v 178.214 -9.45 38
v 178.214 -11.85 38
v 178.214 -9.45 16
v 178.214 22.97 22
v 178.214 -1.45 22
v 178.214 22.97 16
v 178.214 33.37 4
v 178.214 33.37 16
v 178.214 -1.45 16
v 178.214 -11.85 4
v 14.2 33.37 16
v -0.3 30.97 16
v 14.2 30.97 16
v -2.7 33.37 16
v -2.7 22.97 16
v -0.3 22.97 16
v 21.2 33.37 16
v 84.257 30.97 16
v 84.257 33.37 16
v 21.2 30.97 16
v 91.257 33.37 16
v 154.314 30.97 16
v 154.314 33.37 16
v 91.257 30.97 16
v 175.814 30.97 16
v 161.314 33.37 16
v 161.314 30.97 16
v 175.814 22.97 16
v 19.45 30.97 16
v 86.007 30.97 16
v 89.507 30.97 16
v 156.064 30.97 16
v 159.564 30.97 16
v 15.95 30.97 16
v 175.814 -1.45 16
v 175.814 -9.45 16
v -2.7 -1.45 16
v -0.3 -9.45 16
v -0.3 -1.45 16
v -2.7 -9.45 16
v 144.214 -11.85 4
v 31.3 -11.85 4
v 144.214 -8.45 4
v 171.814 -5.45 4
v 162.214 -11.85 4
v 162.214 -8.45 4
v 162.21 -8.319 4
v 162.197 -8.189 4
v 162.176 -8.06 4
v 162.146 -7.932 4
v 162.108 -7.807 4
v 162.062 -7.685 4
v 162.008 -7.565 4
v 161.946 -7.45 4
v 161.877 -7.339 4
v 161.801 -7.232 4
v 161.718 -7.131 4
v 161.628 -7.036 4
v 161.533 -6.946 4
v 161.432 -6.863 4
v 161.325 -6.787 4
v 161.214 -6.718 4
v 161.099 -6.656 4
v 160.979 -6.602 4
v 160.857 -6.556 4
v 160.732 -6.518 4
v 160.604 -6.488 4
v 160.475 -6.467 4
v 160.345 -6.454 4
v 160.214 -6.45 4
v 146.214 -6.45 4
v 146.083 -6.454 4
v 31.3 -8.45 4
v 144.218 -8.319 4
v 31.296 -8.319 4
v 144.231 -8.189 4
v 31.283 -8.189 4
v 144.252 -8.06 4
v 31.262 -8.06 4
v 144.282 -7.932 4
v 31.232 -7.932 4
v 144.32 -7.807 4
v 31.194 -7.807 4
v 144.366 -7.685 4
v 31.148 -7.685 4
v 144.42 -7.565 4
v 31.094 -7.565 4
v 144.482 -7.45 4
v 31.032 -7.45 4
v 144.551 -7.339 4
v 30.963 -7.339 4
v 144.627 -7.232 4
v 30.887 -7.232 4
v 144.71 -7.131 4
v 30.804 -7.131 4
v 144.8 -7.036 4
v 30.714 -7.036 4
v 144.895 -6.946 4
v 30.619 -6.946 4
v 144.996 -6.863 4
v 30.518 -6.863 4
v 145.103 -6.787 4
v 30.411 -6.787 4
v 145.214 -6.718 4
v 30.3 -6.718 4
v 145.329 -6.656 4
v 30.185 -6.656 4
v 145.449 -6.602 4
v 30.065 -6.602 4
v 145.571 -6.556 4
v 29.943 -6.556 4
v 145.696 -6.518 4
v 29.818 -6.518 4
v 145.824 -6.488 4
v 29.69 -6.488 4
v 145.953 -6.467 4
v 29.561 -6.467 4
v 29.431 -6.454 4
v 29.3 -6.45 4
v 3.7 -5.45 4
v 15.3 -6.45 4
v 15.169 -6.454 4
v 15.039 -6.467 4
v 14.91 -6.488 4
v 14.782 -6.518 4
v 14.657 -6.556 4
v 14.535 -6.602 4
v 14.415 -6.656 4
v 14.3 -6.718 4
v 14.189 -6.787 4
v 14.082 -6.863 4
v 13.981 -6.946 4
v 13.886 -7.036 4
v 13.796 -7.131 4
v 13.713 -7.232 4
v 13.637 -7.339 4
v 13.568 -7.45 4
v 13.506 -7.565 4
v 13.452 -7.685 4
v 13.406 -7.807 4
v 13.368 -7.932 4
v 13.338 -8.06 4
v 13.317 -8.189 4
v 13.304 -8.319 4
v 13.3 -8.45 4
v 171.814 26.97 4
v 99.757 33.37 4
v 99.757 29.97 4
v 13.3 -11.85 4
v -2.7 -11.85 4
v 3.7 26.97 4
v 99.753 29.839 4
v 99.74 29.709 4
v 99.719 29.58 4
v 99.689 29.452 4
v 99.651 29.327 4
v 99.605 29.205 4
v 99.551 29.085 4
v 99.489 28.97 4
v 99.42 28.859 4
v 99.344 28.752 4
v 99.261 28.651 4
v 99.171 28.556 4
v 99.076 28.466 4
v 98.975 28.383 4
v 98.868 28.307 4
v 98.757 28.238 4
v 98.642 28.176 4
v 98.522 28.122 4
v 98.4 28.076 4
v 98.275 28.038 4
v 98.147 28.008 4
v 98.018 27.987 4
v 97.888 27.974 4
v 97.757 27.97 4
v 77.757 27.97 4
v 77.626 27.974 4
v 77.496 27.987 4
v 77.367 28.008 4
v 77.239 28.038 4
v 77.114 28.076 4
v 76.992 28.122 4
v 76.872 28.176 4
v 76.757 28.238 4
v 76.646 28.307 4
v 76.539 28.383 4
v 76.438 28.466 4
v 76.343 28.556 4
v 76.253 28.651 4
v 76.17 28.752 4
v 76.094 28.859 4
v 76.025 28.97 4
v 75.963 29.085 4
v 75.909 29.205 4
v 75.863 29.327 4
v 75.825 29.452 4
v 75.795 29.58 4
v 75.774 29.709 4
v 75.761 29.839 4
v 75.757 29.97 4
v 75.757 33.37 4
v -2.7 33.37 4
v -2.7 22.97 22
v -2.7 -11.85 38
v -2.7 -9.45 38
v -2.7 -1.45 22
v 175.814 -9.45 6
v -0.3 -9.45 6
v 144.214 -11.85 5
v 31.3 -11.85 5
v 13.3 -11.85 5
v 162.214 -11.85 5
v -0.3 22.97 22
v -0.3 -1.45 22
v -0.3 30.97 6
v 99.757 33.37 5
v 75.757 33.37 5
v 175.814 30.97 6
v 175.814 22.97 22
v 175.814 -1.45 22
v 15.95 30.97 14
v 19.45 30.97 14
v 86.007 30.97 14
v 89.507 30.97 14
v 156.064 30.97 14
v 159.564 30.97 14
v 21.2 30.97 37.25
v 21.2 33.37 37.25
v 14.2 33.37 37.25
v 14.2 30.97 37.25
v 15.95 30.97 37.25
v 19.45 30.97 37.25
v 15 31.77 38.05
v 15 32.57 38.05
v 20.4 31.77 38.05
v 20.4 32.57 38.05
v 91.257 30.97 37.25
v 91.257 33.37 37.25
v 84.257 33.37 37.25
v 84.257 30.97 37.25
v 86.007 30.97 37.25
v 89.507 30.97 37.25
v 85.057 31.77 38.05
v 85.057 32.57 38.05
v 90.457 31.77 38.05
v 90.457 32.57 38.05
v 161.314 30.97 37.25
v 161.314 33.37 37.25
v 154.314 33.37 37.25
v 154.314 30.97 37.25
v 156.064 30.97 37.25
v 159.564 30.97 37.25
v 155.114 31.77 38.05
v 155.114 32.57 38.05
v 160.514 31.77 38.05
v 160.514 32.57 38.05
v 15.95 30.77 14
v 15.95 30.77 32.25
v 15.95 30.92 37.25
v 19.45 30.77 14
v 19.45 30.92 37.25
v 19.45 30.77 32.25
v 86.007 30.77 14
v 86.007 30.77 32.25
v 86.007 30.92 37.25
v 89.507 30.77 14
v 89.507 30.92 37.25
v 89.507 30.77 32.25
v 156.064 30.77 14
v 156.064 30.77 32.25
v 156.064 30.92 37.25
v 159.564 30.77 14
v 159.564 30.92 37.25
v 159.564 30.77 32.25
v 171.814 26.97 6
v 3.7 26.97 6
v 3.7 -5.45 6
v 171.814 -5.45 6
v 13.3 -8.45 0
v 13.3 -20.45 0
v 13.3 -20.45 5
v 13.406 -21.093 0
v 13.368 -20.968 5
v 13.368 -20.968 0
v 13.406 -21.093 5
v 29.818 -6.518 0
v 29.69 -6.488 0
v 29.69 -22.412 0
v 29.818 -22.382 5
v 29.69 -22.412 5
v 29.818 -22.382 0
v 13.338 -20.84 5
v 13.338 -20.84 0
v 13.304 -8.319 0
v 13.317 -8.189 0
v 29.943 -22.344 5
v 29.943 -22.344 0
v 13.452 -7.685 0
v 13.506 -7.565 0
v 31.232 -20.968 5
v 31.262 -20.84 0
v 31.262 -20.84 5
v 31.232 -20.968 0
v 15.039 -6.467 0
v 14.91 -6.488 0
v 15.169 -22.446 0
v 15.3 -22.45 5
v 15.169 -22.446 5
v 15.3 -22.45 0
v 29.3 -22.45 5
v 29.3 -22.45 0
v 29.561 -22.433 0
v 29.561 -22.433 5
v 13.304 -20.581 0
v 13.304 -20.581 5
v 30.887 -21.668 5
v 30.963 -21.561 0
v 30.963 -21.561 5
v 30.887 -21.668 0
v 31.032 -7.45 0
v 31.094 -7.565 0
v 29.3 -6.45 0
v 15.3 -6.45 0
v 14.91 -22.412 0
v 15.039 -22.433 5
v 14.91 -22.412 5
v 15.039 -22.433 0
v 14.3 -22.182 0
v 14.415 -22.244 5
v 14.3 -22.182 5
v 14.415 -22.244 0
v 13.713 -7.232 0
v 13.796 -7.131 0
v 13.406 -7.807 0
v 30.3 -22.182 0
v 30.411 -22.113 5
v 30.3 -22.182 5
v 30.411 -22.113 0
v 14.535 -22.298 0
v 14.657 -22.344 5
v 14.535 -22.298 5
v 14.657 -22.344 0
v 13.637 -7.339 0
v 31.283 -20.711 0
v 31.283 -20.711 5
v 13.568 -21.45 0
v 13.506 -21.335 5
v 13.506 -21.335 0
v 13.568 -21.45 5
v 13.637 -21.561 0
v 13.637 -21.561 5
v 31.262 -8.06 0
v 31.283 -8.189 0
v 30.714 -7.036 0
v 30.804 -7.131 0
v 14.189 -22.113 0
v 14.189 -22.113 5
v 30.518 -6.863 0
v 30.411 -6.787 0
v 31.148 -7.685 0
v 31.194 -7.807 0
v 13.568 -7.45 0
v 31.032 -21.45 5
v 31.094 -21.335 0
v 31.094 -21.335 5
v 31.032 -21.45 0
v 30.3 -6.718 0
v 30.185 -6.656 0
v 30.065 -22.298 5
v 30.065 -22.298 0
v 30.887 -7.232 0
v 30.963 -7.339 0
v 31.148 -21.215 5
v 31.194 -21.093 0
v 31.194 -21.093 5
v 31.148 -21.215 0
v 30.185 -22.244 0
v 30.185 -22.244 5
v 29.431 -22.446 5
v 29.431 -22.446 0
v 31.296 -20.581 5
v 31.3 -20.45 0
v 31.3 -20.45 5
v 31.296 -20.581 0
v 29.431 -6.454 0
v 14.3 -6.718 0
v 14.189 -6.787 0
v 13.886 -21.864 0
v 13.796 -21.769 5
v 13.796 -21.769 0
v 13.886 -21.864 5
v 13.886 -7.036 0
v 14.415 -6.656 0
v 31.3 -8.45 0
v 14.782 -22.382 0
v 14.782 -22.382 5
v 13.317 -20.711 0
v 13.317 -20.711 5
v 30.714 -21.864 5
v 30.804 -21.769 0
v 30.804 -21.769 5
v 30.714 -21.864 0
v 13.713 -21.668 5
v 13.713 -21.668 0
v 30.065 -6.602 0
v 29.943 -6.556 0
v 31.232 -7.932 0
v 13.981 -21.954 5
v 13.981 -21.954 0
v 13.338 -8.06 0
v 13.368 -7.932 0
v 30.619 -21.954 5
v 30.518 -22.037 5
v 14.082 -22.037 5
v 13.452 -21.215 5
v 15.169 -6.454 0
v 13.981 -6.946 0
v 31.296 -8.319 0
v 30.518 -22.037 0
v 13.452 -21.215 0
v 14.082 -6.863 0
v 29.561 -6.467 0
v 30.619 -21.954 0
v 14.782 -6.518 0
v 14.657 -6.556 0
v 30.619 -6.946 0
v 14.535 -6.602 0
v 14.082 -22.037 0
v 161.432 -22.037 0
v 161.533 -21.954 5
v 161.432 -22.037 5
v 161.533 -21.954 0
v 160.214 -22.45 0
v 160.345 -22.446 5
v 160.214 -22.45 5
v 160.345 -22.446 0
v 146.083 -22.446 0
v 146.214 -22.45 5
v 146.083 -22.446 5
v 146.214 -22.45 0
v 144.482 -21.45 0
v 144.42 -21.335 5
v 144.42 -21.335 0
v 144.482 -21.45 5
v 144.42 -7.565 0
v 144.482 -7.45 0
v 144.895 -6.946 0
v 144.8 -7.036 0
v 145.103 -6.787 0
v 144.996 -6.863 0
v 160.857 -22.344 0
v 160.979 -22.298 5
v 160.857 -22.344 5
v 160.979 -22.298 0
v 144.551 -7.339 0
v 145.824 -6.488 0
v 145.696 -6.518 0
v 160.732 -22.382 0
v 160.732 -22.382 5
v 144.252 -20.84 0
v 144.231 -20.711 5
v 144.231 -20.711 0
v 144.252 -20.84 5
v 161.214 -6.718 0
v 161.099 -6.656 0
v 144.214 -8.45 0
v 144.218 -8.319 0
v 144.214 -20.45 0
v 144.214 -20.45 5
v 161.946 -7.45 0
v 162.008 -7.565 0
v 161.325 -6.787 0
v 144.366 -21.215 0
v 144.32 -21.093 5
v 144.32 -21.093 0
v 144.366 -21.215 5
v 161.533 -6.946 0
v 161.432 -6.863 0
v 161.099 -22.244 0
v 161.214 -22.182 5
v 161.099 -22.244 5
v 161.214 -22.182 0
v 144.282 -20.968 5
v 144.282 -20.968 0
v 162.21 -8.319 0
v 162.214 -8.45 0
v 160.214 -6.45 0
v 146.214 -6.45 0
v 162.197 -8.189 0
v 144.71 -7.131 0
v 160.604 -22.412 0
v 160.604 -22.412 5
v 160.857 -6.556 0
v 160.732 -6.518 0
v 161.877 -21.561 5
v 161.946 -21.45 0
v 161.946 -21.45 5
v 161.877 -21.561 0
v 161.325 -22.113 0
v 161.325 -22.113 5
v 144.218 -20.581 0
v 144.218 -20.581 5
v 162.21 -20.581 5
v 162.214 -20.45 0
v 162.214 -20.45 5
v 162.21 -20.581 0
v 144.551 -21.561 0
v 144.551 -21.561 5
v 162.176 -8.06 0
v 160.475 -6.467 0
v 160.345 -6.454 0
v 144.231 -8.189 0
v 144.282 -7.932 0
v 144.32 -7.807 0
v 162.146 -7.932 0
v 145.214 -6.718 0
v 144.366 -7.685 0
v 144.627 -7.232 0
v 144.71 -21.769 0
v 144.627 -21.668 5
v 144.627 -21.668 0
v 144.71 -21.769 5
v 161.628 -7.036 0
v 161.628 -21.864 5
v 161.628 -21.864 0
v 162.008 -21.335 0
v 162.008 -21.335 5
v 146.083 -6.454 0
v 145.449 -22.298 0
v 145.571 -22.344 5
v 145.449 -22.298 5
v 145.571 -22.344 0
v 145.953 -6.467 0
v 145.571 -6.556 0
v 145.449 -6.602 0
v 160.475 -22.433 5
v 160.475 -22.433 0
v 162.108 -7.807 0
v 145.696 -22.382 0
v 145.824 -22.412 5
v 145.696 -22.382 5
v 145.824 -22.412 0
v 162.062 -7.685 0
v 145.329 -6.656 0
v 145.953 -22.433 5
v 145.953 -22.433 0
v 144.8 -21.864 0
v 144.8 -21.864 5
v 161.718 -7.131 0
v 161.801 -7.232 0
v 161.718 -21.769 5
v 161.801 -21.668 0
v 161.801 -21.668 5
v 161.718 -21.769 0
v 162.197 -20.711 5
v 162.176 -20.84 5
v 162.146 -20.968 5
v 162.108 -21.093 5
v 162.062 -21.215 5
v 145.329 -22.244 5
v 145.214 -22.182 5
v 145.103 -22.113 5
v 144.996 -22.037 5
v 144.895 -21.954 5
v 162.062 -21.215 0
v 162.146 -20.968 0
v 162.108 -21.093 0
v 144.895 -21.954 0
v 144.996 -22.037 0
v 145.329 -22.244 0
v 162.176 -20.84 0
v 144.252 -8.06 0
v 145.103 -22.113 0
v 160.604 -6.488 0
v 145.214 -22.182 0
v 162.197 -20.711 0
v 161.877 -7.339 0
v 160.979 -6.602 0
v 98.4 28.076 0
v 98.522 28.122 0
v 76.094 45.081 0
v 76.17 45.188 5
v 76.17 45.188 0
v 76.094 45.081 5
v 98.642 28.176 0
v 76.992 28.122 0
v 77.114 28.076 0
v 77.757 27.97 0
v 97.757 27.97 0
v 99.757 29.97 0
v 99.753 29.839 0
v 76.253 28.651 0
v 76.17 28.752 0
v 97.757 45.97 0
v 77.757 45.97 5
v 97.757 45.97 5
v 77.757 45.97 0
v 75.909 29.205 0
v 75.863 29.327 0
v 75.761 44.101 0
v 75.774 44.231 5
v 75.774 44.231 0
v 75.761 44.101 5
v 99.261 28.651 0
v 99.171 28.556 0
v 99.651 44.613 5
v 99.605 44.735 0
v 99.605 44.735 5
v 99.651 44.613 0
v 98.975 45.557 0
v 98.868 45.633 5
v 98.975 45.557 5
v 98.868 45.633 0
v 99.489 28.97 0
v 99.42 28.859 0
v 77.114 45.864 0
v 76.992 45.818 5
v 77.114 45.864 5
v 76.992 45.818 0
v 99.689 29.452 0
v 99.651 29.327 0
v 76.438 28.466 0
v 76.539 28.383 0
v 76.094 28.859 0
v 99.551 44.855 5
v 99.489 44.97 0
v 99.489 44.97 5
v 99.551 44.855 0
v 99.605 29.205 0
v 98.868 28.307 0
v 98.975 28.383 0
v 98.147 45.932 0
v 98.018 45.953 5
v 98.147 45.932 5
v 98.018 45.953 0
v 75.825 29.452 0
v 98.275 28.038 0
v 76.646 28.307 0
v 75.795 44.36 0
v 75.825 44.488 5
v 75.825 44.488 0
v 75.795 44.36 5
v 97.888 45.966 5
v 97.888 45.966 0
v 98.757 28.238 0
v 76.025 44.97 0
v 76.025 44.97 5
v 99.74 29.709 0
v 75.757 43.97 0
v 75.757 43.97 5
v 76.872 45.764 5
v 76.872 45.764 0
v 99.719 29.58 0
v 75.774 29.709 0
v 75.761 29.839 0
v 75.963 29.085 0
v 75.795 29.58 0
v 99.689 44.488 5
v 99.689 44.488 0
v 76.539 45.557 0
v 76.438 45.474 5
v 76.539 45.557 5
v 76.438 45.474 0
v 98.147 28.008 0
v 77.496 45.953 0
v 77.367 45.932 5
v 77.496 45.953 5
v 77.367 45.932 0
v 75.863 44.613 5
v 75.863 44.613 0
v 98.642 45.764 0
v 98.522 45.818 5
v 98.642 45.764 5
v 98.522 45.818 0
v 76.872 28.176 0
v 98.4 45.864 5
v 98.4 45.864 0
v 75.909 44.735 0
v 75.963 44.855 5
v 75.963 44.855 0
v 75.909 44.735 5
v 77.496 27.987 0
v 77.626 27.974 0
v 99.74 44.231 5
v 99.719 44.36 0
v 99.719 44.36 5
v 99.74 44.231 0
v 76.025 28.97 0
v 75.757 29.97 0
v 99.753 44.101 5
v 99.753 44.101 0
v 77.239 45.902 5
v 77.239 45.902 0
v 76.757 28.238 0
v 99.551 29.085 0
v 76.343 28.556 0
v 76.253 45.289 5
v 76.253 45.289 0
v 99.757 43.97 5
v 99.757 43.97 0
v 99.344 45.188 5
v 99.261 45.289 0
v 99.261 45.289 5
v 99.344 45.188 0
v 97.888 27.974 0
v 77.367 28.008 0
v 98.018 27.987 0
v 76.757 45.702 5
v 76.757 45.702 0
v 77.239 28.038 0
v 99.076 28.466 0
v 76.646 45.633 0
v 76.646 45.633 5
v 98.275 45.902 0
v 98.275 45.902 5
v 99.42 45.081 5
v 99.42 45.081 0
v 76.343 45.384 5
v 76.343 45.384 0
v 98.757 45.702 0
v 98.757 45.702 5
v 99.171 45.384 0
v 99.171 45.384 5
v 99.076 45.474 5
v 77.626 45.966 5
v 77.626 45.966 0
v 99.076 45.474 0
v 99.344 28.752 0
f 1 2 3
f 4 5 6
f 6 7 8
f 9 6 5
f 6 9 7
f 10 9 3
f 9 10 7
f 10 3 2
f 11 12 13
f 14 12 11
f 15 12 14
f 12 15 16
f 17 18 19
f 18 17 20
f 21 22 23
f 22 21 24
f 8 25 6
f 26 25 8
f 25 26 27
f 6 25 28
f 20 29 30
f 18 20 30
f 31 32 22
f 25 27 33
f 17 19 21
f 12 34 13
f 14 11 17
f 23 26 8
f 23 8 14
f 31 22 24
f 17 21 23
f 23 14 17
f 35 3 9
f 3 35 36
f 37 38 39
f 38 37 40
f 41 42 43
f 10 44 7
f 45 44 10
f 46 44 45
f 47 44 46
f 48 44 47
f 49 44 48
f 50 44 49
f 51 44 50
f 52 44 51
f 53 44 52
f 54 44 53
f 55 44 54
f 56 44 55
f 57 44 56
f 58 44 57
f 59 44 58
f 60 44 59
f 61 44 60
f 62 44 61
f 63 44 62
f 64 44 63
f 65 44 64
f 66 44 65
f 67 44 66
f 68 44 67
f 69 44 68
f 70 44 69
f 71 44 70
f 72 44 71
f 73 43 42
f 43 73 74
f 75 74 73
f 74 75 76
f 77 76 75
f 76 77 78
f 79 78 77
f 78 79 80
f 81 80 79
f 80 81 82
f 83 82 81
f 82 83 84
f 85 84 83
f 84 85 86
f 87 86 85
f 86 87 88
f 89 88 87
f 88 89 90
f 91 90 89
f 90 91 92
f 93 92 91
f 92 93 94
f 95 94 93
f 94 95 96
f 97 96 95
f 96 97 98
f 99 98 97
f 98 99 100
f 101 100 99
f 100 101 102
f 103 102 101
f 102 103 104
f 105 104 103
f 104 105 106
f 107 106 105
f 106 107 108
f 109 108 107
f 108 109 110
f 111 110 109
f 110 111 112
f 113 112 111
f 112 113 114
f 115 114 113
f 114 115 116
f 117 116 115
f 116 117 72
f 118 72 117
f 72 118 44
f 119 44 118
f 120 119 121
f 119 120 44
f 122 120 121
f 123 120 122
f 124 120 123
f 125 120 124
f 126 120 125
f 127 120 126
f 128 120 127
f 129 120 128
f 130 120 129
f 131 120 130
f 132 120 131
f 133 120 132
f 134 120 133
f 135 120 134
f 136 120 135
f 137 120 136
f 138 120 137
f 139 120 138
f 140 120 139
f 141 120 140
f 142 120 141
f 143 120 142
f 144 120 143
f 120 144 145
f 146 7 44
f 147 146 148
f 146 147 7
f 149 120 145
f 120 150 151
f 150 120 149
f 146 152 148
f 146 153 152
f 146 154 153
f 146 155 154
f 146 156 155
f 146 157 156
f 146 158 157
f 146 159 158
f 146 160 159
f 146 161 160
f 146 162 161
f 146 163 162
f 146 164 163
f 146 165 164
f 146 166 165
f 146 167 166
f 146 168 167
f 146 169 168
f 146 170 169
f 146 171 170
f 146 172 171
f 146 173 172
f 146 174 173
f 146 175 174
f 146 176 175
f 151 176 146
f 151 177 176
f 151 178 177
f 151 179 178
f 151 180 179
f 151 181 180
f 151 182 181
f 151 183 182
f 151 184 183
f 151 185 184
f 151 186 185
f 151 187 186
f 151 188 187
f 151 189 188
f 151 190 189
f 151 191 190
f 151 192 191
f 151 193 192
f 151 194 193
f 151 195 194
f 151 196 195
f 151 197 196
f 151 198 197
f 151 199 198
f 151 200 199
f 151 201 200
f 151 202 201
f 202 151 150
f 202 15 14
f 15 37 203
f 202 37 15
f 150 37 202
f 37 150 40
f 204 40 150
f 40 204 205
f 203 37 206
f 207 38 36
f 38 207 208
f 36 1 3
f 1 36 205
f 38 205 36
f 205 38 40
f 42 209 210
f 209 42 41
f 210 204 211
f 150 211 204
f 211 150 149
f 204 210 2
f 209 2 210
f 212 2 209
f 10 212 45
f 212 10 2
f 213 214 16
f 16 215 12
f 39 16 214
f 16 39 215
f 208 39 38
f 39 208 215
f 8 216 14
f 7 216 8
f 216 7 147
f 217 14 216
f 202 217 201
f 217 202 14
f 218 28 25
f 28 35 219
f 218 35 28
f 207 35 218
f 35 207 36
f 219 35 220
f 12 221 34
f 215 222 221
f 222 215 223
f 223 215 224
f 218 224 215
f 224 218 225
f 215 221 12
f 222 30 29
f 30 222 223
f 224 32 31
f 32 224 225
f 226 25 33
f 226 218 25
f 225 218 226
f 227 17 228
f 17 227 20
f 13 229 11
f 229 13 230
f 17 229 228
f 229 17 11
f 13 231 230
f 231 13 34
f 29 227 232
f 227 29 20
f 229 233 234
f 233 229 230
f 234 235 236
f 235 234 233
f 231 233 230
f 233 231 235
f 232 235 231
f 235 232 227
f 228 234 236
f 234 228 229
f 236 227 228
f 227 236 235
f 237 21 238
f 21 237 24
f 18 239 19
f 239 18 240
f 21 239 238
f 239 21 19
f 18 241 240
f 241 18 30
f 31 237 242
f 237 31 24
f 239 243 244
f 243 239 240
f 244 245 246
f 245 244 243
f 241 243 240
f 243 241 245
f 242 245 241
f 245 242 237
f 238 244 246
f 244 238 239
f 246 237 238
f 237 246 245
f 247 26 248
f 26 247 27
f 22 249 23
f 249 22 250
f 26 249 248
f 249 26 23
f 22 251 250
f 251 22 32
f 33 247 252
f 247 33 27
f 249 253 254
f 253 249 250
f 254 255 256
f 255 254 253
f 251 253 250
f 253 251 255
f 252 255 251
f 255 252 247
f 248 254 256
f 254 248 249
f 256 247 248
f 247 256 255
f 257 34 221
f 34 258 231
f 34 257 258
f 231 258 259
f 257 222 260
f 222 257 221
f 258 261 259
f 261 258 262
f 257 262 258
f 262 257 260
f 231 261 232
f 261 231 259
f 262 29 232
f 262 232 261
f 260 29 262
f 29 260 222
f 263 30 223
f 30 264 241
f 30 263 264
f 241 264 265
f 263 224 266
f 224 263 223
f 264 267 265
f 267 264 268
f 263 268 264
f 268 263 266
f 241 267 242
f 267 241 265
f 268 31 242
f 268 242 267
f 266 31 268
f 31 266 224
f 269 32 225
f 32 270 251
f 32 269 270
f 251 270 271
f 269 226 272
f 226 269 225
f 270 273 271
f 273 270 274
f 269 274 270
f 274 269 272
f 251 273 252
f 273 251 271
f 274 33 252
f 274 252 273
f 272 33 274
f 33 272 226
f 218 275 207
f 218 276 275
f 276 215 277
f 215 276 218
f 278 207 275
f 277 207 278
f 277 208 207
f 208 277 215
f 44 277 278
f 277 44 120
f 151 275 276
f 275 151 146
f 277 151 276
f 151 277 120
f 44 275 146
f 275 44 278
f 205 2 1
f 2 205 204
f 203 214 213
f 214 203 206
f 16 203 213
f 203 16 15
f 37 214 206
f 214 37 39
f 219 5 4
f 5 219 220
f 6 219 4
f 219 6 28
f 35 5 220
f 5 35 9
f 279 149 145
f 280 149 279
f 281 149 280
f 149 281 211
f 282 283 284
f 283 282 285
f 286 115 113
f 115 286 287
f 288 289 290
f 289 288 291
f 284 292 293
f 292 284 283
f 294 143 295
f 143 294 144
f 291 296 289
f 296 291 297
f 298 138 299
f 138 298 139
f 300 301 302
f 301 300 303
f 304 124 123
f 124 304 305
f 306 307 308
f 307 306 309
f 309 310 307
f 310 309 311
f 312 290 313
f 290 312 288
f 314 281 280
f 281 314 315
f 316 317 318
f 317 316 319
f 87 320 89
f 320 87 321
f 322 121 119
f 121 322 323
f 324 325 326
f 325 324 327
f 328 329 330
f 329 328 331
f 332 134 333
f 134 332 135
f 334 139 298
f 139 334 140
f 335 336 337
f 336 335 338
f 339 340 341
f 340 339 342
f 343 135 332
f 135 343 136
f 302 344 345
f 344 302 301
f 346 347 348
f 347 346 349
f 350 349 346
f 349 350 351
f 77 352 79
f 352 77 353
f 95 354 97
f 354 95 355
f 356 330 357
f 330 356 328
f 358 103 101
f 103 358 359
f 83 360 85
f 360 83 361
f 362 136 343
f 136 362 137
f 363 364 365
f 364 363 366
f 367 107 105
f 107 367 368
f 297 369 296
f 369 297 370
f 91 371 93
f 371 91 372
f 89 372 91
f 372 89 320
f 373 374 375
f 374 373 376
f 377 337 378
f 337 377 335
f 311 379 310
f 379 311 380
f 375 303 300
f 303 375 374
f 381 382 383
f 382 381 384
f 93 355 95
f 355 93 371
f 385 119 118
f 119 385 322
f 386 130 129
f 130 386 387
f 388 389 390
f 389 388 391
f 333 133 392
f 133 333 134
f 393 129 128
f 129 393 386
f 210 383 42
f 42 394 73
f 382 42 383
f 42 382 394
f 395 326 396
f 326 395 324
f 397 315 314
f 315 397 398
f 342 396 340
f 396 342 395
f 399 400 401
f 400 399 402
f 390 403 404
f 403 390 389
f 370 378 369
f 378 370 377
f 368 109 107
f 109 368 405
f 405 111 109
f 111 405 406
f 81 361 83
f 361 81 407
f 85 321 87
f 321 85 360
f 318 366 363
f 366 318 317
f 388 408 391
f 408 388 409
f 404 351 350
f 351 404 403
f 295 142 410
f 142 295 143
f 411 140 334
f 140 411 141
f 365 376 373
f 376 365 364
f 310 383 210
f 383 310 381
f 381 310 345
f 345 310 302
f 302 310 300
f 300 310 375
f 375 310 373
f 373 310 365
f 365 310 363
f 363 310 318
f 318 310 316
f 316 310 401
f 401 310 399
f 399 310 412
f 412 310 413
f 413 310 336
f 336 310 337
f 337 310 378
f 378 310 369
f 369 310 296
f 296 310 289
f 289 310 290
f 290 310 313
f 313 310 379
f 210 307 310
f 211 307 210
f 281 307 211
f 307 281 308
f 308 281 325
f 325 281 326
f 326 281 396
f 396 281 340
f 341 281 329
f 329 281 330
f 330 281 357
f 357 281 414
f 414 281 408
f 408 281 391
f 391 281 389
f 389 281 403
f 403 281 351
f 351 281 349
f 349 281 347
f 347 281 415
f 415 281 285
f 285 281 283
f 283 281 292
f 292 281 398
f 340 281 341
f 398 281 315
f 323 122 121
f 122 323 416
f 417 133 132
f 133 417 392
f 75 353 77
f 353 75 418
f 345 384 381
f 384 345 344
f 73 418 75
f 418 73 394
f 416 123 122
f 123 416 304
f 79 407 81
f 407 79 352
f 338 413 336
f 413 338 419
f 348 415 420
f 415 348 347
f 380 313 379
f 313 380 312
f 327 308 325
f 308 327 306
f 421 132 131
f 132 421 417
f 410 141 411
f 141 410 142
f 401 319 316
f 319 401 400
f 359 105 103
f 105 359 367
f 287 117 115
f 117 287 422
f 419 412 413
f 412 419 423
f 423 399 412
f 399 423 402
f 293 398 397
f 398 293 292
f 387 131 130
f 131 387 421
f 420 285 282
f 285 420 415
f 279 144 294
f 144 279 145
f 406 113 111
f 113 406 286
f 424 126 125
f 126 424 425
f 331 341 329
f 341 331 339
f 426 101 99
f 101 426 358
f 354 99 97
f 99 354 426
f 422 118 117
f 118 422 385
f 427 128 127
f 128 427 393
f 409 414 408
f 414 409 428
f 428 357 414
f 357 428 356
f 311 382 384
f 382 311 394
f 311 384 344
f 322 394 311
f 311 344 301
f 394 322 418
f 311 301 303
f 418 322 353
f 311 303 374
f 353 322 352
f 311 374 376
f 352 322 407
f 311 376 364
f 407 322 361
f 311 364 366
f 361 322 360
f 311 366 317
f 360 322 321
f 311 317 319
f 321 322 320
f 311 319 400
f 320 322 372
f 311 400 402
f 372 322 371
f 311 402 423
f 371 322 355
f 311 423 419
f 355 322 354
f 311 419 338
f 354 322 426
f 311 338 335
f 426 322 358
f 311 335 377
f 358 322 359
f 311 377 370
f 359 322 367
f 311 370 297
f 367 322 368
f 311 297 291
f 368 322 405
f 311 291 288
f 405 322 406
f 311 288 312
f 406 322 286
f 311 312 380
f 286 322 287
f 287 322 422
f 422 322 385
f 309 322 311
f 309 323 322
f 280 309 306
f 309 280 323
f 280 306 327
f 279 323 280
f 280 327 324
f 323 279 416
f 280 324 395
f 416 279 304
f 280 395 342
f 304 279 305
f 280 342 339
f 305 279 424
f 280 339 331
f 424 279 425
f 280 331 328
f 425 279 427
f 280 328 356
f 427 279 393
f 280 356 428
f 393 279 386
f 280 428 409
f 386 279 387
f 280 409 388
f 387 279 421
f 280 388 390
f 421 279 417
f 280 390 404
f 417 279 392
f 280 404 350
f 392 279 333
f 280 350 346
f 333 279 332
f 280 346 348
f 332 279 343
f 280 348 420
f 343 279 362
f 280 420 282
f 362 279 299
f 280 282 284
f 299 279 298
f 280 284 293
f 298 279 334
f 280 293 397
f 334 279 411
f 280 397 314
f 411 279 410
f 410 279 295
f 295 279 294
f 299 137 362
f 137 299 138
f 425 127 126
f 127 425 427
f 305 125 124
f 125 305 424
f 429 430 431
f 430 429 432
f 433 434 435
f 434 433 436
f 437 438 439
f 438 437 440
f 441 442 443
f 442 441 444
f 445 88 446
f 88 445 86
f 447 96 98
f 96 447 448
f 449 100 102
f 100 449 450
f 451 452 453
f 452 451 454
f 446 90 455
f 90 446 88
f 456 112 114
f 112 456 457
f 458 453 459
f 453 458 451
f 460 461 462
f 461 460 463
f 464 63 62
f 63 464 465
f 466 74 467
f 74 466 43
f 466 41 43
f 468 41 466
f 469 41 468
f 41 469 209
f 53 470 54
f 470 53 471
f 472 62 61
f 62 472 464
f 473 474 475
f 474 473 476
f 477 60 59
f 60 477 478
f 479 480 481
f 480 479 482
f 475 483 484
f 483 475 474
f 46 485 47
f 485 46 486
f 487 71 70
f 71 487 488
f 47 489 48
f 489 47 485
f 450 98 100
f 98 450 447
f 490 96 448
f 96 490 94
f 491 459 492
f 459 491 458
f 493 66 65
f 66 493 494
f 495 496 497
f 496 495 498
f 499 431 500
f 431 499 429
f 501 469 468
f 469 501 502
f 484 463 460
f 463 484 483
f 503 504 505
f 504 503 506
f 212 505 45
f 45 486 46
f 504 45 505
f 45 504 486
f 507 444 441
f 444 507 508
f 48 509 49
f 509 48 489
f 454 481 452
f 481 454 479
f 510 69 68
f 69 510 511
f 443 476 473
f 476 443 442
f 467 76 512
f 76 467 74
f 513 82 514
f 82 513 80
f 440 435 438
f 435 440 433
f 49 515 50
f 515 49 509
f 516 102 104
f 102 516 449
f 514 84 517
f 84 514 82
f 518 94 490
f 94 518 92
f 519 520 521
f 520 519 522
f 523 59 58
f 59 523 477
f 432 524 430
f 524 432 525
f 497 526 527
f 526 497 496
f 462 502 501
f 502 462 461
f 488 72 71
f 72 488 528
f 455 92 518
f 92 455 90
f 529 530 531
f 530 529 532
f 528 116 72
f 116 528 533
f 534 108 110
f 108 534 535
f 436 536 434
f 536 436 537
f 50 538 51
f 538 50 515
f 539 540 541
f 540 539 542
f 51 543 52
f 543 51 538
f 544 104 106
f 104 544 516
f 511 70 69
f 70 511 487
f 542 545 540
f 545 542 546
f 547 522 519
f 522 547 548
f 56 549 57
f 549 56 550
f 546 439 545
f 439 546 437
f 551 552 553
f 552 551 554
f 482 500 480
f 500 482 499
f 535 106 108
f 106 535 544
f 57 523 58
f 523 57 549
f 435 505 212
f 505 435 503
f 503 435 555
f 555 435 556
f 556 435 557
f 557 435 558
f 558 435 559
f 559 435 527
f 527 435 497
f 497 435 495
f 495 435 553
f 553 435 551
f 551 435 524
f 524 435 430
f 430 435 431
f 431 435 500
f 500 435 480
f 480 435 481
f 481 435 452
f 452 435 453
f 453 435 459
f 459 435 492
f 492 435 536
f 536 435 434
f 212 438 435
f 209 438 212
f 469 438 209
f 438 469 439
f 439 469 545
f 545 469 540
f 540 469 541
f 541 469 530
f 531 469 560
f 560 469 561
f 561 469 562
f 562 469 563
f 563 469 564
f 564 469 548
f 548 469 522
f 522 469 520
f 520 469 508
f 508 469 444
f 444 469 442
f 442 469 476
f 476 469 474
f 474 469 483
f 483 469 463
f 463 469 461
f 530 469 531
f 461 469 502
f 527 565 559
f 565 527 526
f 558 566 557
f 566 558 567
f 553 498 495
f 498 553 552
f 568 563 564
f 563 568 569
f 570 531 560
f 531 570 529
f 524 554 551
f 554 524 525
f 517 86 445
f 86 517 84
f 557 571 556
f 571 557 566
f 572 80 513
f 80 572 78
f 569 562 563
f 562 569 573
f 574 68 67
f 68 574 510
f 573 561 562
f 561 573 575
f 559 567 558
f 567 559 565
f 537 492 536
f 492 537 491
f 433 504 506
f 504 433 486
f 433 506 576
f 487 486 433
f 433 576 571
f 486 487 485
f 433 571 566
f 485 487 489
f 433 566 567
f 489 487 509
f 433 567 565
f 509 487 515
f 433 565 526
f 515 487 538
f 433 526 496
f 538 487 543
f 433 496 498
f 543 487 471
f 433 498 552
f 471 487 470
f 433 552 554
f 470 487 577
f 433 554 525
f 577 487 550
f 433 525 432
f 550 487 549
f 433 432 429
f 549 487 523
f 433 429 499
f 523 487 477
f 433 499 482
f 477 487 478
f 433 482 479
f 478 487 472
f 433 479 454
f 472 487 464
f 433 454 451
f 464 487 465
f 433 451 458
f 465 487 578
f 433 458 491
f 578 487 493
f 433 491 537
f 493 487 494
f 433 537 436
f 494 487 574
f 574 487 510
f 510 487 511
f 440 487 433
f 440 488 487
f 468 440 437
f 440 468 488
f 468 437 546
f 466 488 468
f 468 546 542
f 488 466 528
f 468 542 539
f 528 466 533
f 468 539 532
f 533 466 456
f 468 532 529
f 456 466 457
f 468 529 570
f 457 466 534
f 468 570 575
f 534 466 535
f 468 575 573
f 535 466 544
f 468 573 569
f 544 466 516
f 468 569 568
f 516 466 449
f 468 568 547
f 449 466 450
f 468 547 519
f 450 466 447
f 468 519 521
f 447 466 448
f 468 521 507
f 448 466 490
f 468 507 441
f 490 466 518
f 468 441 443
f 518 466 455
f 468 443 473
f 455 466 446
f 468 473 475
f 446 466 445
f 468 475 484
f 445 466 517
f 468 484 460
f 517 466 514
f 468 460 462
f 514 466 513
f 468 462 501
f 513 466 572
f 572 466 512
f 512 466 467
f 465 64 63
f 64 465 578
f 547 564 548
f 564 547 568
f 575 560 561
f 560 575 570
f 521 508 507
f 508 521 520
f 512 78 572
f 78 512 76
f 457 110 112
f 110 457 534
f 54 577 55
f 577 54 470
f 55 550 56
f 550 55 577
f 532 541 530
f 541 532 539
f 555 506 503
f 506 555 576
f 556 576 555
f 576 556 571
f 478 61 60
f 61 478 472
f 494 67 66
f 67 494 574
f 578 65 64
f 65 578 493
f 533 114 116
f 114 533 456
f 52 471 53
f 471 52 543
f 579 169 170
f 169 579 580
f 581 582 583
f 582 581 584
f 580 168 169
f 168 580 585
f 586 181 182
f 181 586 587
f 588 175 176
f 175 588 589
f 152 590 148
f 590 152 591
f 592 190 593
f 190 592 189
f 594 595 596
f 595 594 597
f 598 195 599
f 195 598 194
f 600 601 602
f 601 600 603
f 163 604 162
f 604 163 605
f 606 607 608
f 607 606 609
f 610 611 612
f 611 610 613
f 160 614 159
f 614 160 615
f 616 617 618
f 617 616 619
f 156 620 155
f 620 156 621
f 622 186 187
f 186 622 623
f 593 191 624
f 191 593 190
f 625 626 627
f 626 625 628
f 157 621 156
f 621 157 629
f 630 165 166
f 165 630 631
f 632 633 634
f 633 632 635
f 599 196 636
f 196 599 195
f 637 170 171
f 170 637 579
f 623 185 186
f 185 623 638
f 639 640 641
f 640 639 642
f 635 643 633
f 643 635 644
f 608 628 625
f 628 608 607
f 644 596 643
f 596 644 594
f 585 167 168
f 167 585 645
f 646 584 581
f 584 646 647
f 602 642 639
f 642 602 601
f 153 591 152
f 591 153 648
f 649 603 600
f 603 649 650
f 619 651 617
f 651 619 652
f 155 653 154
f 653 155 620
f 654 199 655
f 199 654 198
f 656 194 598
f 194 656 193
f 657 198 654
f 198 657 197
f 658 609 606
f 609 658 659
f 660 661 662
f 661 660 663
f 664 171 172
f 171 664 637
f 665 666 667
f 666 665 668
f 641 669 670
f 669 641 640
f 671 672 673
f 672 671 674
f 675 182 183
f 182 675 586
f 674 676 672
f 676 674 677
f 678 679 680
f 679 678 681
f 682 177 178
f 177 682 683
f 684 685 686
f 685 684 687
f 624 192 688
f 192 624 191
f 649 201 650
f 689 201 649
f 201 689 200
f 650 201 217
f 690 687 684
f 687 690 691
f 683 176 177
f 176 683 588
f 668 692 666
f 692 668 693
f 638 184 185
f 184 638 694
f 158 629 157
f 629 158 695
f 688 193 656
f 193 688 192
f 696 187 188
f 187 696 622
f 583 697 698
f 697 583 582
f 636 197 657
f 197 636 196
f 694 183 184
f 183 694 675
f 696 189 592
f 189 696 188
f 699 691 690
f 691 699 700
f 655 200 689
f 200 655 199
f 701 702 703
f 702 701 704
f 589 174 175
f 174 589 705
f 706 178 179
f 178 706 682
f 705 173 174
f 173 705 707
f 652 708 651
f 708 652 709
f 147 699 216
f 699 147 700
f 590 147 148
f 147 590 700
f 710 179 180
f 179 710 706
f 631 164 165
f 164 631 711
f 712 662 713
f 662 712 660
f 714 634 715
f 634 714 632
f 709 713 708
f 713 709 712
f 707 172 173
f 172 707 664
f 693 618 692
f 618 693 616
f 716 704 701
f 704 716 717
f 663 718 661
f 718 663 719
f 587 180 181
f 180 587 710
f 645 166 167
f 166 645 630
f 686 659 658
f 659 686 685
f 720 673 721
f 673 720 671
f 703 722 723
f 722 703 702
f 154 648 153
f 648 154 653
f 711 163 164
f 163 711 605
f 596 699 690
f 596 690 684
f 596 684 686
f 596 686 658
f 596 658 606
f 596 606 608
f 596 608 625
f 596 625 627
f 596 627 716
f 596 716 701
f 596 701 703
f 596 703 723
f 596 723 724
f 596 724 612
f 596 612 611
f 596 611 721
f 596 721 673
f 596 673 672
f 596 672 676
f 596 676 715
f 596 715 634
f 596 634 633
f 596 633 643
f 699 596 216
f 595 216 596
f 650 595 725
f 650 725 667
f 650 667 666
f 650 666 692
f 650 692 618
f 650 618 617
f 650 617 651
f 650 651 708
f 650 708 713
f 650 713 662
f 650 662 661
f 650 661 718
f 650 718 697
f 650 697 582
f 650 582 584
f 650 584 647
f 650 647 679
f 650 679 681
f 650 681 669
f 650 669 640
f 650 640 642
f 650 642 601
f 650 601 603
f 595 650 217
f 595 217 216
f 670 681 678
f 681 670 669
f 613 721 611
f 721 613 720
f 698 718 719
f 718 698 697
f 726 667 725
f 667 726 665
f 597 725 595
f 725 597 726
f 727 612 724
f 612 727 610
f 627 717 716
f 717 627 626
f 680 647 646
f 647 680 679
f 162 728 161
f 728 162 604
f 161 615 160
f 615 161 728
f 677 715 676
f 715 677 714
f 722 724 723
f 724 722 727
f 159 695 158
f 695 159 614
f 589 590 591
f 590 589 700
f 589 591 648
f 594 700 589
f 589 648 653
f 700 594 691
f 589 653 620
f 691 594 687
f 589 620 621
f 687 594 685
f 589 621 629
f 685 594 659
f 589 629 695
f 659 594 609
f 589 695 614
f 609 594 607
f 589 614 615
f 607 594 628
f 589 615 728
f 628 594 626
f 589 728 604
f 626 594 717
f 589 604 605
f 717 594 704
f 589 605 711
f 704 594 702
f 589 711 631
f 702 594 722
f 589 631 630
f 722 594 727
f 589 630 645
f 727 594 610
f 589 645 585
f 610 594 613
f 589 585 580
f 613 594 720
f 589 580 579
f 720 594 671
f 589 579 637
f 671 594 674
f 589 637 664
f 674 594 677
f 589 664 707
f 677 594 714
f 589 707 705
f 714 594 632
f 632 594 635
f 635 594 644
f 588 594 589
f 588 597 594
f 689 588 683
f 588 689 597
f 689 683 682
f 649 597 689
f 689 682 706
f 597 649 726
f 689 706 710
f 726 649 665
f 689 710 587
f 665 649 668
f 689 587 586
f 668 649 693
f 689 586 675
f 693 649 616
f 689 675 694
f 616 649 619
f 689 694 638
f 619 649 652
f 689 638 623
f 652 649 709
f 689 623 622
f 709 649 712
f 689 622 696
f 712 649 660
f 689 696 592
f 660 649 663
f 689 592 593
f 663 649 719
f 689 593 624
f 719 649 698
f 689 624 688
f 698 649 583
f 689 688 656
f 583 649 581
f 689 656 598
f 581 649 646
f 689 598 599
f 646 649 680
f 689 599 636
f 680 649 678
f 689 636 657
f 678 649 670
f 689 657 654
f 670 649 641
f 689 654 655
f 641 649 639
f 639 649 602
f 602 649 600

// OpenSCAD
// DOUBLE TAKE FRAMES DESIGN RELEASE
// DTF_RELEASE: 2.0.0
// Released: 2026-08-31
// Versioning: Semantic Versioning 2.0.0 (https://semver.org/)
// Status: CANONICAL
// Changes in 2.0.0:
// - Carried forward without geometry changes for the coordinated 2.0.0 release.
// Full release notes: https://doubletakeframes.com/build/#design-release
//
$fn = 96;
eps = 0.05;

// =========================================================
// DETACHABLE FRONT BAND + SIDE WALLS + REAR POSTS + FEETS
// Continuous low rail all around.
// Side walls sit on rail but do not connect to front/back above rail.
// Non-friction resting fit.
//
// Corrected:
// - Feet overlap collar/body in Z by foot_body_z_overlap, not just eps.
// - Each foot is shifted a few mm inward under the basket while keeping
//   the original front/rear foot depth.
// =========================================================

inch = 25.4;

// CASSETTE REFERENCE VALUES
cassette_w = 6.91 * inch;

bottom_t    = 3.0;
wall_t      = 3.0;
wall_offset = 0.0;

front_frame_t    = 1.2;
acrylic_gap      = 1.0;
spacer_thickness = 7.0;

front_buildout_total = front_frame_t + acrylic_gap + spacer_thickness;
front_buildout_y0    = wall_offset - front_buildout_total;

roller_r    = 0.75 * inch;
glide_t     = 2.0;
fang_embed  = 0.6;
rail_back_y = 8.0;
roller_cy   = wall_offset + wall_t;

glide_y  = roller_cy + roller_r - glide_t - fang_embed;
bottom_d = glide_y + glide_t + rail_back_y;

backing_board_extra_y = 1/20 * inch;

cassette_x0 = 0;
cassette_x1 = cassette_w;
cassette_y0 = front_buildout_y0;
cassette_y1 = bottom_d + backing_board_extra_y;

// FIT / GEOMETRY
clear_x = 0.3;
clear_y = 0.25;

collar_t = 2.4;

foot_h = 5.0;
foot_body_z_overlap = 1.0;
collar_z0 = foot_h - foot_body_z_overlap;

collar_h = 34.0;
side_wall_h = 18.0;
inner_x0 = cassette_x0 - clear_x;
inner_x1 = cassette_x1 + clear_x;
inner_y0 = cassette_y0 - clear_y;
inner_y1 = cassette_y1 + clear_y;

outer_x0 = inner_x0 - collar_t;
outer_x1 = inner_x1 + collar_t;
outer_y0 = inner_y0 - collar_t;
outer_y1 = inner_y1 + collar_t;

// RESTING LEDGE
rest_lip_t = 4.0;
rest_lip_h = 2.0;

// LOW RAIL
low_rail_h = 12.0;

// SIDE WALLS
side_wall_gap_front = 8.0;
side_wall_gap_rear  = 8.0;
side_wall_t = collar_t;

// REAR POSTS
rear_post_w = 7.0;
rear_post_t = collar_t;
post_bevel = 0.8;

// Localized friction take-up on the three rear backing-board capture posts.
// These project into the existing Y clearance without moving the posts or
// tightening the stand's overall envelope. The upper ramp eases insertion.
rear_post_friction_pad_d = 0.20;
rear_post_friction_pad_w = 3.5;
rear_post_friction_pad_z0 = collar_z0 + low_rail_h - 2.0;
rear_post_friction_pad_z1 = collar_z0 + collar_h - post_bevel;
rear_post_friction_ramp_h = 5.0;

// FEET
front_foot_proj = 16.0;
rear_foot_proj  = 18.0;

front_foot_w = 18.0;
rear_foot_w  = 24.0;

front_foot_inset_x = 16.0;
foot_round = 2.0;

// How far the inner edge of each foot reaches under the basket.
// Original effectively stopped ~0.6 mm short of the inner edge.
foot_y_overlap = 3.0;

// HELPERS
module rounded_rect_prism(x0, x1, y0, y1, z0, z1, r=2) {
    hull() {
        translate([x0+r, y0+r, z0]) cylinder(r=r, h=z1-z0);
        translate([x1-r, y0+r, z0]) cylinder(r=r, h=z1-z0);
        translate([x0+r, y1-r, z0]) cylinder(r=r, h=z1-z0);
        translate([x1-r, y1-r, z0]) cylinder(r=r, h=z1-z0);
    }
}

module beveled_post(xsz, ysz, h, b) {
    bx = min(b, xsz/2 - eps);
    by = min(b, ysz/2 - eps);

    union() {
        cube([xsz, ysz, h - b]);

        translate([0, 0, h - b])
        hull() {
            cube([xsz, ysz, eps]);

            translate([bx, by, b])
                cube([
                    max(eps, xsz - 2*bx),
                    max(eps, ysz - 2*by),
                    eps
                ]);
        }
    }
}

// FRONT BAND
module front_band() {
    translate([outer_x0, outer_y0, collar_z0])
        cube([
            outer_x1 - outer_x0,
            collar_t,
            collar_h
        ]);
}

// CONTINUOUS LOW RAIL
module front_low_rail() {
    translate([outer_x0, outer_y0, collar_z0])
        cube([outer_x1 - outer_x0, collar_t, low_rail_h]);
}

module left_low_rail() {
    translate([outer_x0, outer_y0, collar_z0])
        cube([collar_t, outer_y1 - outer_y0, low_rail_h]);
}

module right_low_rail() {
    translate([outer_x1 - collar_t, outer_y0, collar_z0])
        cube([collar_t, outer_y1 - outer_y0, low_rail_h]);
}

module rear_low_rail() {
    translate([outer_x0, outer_y1 - collar_t, collar_z0])
        cube([outer_x1 - outer_x0, collar_t, low_rail_h]);
}

module low_rails() {
    // front rail overlaps lower part of front band; harmless and strengthens base
    front_low_rail();
    left_low_rail();
    right_low_rail();
    rear_low_rail();
}

// SIDE WALLS
module left_side_wall() {
    y0 = inner_y0 + side_wall_gap_front;
    y1 = inner_y1 - side_wall_gap_rear;

    translate([outer_x0, y0, collar_z0])
        cube([
            side_wall_t,
            y1 - y0,
            side_wall_h
        ]);
}

module right_side_wall() {
    y0 = inner_y0 + side_wall_gap_front;
    y1 = inner_y1 - side_wall_gap_rear;

    translate([inner_x1, y0, collar_z0])
        cube([
            side_wall_t,
            y1 - y0,
            side_wall_h
        ]);
}

// REAR POSTS
module rear_post(x_center) {
    translate([x_center - rear_post_w/2, inner_y1, collar_z0])
        beveled_post(rear_post_w, rear_post_t, collar_h, post_bevel);
}

module rear_post_friction_pad(x_center) {
    pad_x0 = x_center - rear_post_friction_pad_w/2;
    full_pad_y0 = inner_y1 - rear_post_friction_pad_d;
    ramp_z0 = rear_post_friction_pad_z1 - rear_post_friction_ramp_h;

    hull() {
        translate([pad_x0, full_pad_y0, rear_post_friction_pad_z0])
            cube([rear_post_friction_pad_w, rear_post_friction_pad_d + eps, eps]);
        translate([pad_x0, full_pad_y0, ramp_z0])
            cube([rear_post_friction_pad_w, rear_post_friction_pad_d + eps, eps]);
        translate([pad_x0, inner_y1 - eps, rear_post_friction_pad_z1])
            cube([rear_post_friction_pad_w, 2*eps, eps]);
    }
}

module rear_posts() {
    left_post_x = inner_x0 + 18.0;
    center_post_x = (inner_x0 + inner_x1) / 2;
    right_post_x = inner_x1 - 18.0;

    rear_post(left_post_x);
    rear_post(center_post_x);
    rear_post(right_post_x);

    rear_post_friction_pad(left_post_x);
    rear_post_friction_pad(center_post_x);
    rear_post_friction_pad(right_post_x);
}

// BOTTOM RESTING LEDGE
module bottom_rest_lip() {
    translate([inner_x0, inner_y0, collar_z0])
        cube([inner_x1 - inner_x0, rest_lip_t, rest_lip_h]);

    translate([inner_x0, inner_y1 - rest_lip_t, collar_z0])
        cube([inner_x1 - inner_x0, rest_lip_t, rest_lip_h]);

    translate([inner_x0, inner_y0, collar_z0])
        cube([rest_lip_t, inner_y1 - inner_y0, rest_lip_h]);

    translate([inner_x1 - rest_lip_t, inner_y0, collar_z0])
        cube([rest_lip_t, inner_y1 - inner_y0, rest_lip_h]);
}

// FEET
module front_left_foot() {
    x0 = outer_x0 + front_foot_inset_x;
    x1 = x0 + front_foot_w;

    // Same foot depth as original, shifted inward for a few mm of underlap.
    y1 = inner_y0 + foot_y_overlap;
    y0 = y1 - front_foot_proj;

    rounded_rect_prism(x0, x1, y0, y1, 0, foot_h, foot_round);
}

module front_right_foot() {
    x1 = outer_x1 - front_foot_inset_x;
    x0 = x1 - front_foot_w;

    // Same foot depth as original, shifted inward for a few mm of underlap.
    y1 = inner_y0 + foot_y_overlap;
    y0 = y1 - front_foot_proj;

    rounded_rect_prism(x0, x1, y0, y1, 0, foot_h, foot_round);
}

module rear_center_foot() {
    x0 = (outer_x0 + outer_x1)/2 - rear_foot_w/2;
    x1 = x0 + rear_foot_w;

    // Same foot depth as original, shifted inward for a few mm of underlap.
    y0 = inner_y1 - foot_y_overlap;
    y1 = y0 + rear_foot_proj;

    rounded_rect_prism(x0, x1, y0, y1, 0, foot_h, foot_round);
}

// FINAL
union() {
    front_band();
    low_rails();

    left_side_wall();
    right_side_wall();
    rear_posts();

    bottom_rest_lip();

    front_left_foot();
    front_right_foot();
    rear_center_foot();
}
